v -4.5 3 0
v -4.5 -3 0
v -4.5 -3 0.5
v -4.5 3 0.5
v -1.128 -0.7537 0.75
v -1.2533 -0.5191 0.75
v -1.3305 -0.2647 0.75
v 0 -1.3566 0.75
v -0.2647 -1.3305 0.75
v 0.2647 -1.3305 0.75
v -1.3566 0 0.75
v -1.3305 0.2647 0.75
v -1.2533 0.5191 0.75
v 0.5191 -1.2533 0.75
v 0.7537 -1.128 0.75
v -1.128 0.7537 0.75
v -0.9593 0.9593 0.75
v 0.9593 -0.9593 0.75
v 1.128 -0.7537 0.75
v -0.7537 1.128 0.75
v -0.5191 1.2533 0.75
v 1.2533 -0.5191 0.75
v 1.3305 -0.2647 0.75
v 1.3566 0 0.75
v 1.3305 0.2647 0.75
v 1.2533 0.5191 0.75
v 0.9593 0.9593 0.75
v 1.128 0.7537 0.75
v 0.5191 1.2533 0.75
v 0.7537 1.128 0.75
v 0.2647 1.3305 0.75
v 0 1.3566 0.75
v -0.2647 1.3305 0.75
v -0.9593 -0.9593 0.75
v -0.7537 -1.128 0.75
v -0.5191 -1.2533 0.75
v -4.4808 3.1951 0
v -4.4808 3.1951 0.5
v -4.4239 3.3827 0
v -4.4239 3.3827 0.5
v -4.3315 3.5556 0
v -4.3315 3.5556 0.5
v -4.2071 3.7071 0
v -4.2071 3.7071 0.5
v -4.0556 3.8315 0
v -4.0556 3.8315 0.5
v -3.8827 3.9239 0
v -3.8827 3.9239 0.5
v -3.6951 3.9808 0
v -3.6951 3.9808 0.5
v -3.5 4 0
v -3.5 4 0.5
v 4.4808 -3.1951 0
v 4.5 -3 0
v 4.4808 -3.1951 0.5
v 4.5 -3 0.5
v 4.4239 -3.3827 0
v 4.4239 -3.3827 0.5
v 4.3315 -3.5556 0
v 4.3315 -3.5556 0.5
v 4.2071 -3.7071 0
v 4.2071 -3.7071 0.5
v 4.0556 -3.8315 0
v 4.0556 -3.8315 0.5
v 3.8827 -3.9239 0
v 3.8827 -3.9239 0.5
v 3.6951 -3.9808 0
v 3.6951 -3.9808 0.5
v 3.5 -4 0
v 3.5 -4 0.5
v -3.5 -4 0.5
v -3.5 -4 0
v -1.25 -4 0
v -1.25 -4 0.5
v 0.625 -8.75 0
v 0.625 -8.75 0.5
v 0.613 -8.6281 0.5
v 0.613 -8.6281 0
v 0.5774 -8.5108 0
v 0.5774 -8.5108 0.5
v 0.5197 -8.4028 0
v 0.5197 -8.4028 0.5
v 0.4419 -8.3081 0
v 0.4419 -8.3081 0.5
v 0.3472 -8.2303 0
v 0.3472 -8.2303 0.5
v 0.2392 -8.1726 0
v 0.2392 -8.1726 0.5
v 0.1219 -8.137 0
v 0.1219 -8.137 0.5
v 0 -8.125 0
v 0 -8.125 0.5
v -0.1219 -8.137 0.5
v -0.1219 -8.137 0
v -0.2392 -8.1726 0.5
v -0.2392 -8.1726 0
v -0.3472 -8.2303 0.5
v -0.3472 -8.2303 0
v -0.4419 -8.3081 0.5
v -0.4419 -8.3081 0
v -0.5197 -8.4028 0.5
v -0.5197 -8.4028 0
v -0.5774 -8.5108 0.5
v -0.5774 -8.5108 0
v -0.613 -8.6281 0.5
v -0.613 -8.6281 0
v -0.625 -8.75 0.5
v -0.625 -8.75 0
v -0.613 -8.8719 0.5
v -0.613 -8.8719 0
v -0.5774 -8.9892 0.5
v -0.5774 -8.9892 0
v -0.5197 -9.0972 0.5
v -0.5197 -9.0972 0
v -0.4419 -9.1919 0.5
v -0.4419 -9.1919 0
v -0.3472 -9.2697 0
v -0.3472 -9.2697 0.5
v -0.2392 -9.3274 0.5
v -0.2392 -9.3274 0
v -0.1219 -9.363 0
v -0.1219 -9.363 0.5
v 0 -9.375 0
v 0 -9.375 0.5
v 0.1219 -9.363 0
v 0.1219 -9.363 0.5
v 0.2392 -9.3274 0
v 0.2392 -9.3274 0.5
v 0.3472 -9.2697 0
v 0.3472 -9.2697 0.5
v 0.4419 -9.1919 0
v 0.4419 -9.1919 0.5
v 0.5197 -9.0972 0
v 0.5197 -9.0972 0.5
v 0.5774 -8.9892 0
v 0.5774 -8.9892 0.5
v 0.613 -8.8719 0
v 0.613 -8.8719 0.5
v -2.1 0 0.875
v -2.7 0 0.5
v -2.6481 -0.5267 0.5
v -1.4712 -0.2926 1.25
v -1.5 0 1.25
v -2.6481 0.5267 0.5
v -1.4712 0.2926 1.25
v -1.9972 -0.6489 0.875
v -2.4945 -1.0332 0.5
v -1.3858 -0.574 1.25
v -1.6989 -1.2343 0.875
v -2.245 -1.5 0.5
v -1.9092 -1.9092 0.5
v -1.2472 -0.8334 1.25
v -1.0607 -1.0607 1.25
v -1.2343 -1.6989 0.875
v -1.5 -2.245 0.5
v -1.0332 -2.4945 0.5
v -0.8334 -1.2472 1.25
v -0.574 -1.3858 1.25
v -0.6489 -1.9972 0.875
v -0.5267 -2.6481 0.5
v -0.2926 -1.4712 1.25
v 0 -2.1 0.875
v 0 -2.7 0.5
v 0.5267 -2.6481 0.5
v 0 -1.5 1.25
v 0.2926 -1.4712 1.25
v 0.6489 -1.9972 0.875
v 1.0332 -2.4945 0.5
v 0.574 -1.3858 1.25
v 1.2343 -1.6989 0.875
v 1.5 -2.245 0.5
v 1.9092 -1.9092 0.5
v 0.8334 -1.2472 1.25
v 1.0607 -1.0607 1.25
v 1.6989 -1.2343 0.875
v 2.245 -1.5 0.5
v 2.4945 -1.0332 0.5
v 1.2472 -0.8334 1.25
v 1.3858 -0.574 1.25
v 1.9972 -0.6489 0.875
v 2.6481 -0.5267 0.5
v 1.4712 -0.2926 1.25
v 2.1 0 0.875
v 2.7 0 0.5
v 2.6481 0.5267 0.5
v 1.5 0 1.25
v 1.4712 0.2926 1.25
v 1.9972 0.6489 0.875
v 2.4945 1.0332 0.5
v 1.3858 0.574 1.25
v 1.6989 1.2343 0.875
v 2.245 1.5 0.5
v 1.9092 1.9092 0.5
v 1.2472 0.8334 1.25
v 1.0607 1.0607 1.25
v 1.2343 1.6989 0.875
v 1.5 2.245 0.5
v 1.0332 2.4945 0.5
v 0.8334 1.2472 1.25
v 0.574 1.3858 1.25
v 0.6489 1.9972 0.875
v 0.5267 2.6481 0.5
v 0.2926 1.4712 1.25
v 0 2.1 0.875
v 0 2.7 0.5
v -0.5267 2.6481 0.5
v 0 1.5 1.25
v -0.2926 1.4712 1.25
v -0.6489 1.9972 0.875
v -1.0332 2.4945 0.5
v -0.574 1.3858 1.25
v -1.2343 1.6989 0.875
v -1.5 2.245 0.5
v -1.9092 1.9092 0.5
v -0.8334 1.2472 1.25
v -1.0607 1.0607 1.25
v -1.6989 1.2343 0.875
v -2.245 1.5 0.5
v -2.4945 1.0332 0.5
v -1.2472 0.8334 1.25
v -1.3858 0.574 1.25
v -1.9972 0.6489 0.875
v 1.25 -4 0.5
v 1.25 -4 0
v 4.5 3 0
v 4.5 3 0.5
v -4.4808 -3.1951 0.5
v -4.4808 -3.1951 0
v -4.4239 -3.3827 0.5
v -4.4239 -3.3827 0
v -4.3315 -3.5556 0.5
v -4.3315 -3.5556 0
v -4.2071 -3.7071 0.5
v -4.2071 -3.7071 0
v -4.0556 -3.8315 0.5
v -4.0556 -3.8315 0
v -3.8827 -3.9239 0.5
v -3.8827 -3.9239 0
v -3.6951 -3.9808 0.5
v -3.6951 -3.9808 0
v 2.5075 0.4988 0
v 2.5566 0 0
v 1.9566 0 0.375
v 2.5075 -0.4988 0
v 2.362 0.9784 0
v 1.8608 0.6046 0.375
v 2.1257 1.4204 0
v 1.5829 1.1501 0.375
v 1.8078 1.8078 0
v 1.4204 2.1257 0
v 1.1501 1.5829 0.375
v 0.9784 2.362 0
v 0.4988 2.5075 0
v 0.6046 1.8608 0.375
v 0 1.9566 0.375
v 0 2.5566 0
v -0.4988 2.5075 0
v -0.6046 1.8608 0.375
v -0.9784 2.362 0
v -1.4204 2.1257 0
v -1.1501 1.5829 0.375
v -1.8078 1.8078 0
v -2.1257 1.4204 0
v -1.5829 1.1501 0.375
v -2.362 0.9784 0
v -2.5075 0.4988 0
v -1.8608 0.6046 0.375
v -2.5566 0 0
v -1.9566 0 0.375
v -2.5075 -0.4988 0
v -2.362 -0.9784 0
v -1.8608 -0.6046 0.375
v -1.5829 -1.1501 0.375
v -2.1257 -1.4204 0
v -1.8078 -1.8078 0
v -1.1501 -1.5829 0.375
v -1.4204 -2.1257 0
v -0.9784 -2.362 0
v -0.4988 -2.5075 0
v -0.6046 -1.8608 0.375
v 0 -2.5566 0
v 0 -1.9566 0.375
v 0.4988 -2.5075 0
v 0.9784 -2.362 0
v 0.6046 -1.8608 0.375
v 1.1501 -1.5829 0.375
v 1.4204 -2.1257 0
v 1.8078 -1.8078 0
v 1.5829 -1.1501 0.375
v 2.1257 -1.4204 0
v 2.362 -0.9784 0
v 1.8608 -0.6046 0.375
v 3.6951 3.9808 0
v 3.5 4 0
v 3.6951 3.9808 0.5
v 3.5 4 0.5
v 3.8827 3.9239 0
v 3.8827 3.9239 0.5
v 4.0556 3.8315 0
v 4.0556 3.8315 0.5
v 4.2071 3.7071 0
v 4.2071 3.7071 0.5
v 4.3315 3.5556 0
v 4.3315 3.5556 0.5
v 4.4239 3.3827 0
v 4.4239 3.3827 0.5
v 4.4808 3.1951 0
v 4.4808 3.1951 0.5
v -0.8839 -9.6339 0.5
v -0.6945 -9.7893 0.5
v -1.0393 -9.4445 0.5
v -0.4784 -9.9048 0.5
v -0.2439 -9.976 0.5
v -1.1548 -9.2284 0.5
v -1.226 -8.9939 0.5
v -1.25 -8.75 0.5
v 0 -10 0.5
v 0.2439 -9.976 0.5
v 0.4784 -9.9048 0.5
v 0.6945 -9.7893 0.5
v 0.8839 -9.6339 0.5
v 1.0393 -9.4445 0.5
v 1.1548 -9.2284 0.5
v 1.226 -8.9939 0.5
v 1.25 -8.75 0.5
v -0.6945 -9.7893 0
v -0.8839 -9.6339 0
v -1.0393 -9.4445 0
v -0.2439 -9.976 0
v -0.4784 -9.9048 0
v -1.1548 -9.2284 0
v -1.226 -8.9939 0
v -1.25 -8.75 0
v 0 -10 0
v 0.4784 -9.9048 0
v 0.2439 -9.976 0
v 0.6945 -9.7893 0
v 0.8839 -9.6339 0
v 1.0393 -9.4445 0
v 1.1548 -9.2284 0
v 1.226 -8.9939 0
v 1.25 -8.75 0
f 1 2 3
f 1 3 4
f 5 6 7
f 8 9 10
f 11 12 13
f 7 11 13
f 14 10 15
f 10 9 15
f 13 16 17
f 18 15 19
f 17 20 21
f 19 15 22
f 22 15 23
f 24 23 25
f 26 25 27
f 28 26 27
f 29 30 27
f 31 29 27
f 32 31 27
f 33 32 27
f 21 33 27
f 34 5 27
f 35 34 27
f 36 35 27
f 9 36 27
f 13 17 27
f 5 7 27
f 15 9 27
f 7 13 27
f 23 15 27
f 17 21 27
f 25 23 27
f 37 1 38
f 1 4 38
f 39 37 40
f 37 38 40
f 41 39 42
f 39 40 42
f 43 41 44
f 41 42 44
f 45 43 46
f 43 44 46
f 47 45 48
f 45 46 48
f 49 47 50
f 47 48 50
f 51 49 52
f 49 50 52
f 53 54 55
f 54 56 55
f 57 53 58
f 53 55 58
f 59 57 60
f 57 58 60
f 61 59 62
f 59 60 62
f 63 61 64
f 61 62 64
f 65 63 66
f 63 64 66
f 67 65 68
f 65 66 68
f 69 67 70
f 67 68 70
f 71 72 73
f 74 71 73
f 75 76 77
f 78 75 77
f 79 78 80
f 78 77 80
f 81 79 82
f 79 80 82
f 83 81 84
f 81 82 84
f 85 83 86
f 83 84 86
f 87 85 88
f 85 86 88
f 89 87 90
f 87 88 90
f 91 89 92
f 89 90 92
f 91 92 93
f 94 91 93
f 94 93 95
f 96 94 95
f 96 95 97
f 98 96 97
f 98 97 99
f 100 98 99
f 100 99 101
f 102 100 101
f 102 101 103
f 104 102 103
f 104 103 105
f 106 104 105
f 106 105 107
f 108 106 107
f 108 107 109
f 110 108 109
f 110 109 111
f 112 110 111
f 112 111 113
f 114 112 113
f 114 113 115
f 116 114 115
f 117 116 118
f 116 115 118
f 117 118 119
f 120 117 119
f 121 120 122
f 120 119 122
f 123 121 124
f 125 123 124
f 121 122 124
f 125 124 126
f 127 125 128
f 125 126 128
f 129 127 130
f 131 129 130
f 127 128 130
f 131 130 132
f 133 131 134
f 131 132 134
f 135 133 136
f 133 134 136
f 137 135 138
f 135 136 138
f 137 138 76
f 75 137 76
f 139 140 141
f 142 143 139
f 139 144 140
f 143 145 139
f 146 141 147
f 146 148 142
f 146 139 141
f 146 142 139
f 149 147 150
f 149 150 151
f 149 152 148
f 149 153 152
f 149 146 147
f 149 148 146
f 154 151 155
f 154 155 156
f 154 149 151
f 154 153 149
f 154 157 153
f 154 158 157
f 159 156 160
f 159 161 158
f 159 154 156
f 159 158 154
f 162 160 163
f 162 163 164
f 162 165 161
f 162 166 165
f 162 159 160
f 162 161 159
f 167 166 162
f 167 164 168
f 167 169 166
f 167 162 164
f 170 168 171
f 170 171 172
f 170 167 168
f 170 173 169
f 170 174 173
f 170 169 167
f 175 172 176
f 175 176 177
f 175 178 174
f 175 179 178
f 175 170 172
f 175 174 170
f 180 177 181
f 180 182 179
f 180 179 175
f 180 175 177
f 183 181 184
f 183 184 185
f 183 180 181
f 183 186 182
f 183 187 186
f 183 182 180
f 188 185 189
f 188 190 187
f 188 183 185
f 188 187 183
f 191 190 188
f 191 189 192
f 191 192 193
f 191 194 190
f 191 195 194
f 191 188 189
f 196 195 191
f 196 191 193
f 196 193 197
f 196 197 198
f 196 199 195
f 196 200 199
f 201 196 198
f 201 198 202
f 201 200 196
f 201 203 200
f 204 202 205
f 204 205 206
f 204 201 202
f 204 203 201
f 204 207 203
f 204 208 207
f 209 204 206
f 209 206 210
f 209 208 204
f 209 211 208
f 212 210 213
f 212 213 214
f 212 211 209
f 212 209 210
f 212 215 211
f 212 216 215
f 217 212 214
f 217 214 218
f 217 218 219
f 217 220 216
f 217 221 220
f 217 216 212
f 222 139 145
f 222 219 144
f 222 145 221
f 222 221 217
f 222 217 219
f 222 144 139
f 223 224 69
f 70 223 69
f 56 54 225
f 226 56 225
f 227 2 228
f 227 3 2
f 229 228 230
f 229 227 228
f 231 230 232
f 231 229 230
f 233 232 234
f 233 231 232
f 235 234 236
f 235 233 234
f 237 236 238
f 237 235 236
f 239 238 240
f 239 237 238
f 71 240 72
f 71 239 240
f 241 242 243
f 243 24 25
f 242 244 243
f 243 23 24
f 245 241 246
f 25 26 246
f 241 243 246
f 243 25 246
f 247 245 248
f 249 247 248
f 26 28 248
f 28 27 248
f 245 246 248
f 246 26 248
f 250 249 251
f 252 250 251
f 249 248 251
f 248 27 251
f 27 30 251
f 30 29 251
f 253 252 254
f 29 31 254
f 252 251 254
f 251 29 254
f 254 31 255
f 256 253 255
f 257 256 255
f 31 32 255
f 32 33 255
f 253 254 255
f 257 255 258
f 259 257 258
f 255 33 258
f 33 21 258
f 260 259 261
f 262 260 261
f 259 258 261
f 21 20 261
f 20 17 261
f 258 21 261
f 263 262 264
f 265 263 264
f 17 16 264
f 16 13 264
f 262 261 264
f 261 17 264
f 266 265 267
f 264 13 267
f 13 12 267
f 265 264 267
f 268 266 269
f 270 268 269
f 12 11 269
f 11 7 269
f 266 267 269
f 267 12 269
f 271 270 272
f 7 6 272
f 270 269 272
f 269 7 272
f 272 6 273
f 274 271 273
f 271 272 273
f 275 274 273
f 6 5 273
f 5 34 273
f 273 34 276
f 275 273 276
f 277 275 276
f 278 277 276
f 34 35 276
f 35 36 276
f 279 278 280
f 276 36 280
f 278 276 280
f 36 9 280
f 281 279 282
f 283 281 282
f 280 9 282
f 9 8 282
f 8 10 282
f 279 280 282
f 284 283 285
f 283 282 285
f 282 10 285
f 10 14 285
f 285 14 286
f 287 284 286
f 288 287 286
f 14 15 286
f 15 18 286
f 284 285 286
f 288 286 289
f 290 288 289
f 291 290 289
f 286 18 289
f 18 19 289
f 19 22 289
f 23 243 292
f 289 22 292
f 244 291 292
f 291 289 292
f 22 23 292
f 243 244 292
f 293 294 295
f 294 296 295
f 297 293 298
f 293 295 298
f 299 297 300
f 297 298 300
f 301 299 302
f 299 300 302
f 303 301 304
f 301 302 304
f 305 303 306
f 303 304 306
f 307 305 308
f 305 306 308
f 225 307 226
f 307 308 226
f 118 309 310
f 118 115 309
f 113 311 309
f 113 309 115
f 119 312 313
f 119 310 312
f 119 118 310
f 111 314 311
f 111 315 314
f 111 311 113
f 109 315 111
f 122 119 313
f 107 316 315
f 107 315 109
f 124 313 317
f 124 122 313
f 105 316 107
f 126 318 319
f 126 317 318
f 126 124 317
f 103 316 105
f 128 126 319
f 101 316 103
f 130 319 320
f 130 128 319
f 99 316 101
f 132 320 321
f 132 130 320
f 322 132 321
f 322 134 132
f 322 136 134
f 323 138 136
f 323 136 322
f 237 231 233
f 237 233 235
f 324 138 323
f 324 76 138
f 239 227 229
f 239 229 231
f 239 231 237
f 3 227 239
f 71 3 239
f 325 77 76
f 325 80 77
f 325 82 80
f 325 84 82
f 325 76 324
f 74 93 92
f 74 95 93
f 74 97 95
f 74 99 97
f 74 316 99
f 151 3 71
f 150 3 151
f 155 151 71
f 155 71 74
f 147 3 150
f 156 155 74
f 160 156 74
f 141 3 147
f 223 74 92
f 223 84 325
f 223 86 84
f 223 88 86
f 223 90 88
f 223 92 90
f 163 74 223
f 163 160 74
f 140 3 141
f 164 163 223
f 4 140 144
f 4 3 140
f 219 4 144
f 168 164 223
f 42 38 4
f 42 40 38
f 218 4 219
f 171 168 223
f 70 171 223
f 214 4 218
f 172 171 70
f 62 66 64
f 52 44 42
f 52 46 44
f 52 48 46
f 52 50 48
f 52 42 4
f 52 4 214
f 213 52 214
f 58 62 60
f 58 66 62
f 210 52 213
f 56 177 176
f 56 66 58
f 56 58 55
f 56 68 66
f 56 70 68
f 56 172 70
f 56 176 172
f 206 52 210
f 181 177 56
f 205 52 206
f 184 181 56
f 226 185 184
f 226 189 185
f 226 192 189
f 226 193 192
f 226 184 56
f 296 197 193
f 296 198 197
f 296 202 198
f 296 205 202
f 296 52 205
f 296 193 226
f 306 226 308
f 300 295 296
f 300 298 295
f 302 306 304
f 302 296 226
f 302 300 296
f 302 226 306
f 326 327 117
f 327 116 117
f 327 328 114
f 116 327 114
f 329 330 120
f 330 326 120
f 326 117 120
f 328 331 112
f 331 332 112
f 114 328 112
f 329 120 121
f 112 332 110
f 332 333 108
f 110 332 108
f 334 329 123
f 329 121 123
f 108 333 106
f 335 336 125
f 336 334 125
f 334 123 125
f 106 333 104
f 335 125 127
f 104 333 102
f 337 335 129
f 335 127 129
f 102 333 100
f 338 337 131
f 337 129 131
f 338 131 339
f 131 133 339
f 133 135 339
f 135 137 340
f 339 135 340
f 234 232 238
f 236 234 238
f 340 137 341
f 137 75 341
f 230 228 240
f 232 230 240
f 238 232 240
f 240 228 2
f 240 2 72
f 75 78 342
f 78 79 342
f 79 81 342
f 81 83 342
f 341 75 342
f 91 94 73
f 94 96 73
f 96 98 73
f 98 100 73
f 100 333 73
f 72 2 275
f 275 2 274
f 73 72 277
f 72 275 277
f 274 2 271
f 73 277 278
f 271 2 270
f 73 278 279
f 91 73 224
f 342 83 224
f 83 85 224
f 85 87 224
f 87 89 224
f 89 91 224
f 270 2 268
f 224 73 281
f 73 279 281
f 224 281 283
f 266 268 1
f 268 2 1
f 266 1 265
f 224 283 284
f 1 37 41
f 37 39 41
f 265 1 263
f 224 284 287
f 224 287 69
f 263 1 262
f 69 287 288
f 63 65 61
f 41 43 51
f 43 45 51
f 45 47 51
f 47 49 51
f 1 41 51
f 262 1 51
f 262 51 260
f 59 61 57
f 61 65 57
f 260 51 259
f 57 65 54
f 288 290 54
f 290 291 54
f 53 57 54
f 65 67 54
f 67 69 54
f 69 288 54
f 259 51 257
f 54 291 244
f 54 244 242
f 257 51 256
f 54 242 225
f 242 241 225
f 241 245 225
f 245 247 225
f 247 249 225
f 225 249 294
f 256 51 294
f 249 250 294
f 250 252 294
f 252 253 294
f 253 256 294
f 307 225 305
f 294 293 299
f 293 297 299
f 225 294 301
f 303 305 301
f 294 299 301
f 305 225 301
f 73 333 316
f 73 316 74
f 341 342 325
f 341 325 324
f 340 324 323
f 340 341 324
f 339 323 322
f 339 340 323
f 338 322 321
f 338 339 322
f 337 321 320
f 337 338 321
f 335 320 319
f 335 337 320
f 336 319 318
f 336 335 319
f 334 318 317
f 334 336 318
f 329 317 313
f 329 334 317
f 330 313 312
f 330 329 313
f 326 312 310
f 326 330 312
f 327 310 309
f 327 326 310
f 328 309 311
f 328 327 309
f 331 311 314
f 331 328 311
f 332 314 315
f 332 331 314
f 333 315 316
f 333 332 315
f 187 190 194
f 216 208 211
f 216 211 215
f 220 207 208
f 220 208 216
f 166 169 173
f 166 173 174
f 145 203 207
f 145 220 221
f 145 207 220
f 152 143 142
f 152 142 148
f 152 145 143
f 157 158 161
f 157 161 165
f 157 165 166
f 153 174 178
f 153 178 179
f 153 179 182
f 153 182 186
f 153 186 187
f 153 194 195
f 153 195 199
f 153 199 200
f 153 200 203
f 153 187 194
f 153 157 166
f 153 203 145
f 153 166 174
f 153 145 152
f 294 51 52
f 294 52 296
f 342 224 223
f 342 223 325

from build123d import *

# Parameters (mm, degrees)
SKETCH1_W           = 9
SKETCH1_H           = 8
BOSS_EXTRUDE1_DEPTH = 0.5
BOSS_EXTRUDE2_DEPTH = 0.5
FILLET1_R           = 1
SKETCH4_R           = 0.625
CUT_EXTRUDE1_DEPTH  = 11.9772492


# Read off the part's stored shape, not the designer's step: Shell1
with BuildPart() as part:
    # Sketch1 → Boss-Extrude1 (new body)
    with BuildSketch(Plane.XY):
        Rectangle(SKETCH1_W, SKETCH1_H)
    extrude(amount=BOSS_EXTRUDE1_DEPTH)

    # Sketch2 → Boss-Extrude2 (add)
    with BuildSketch(Plane.XY):
        with BuildLine():
            Line((1.25, 0), (1.25, -8.75))
            ThreePointArc((1.25, -8.75), (0, -10), (-1.25, -8.75))
            Line((-1.25, -8.75), (-1.25, 0))
            ThreePointArc((-1.25, 0), (0, 1.25), (1.25, 0))
        make_face()
    extrude(amount=BOSS_EXTRUDE2_DEPTH)

    # Fillet1
    fillet1_edges = [part.edges().sort_by_distance(p)[0] for p in [
        (4.5, -4, 0.25),
        (-4.5, -4, 0.25),
        (-4.5, 4, 0.25),
        (4.5, 4, 0.25),
    ]]
    fillet(fillet1_edges, radius=FILLET1_R)

    # Sketch4 → Cut-Extrude1 (cut, through all)
    with BuildSketch(Plane.XY.offset(0.5)):
        with Locations((0, -8.75)):
            Circle(SKETCH4_R)
    extrude(amount=-CUT_EXTRUDE1_DEPTH, mode=Mode.SUBTRACT)

    # Sketch5 → Revolve1 (revolve)
    with BuildSketch(Plane(origin=(0, 0, 0), x_dir=(1, 0, 0), z_dir=(0, 1, 0)), mode=Mode.PRIVATE) as revolve1_sk:
        Polygon((0, -0.5), (2.7, -0.5), (1.5, -1.25), (0, -1.25), align=None)
    revolve(revolve1_sk.sketch.rotate(Axis((0, 0, -88.99), (0, 0, 1)), 180), axis=Axis((0, 0, -88.99), (0, 0, 1)))

    # Shell1 outline → Shell1 (revolve, cut)
    with BuildSketch(Plane.XZ):
        Polygon((2.556601887, 0), (1.356601887, 0.75), (0, 0.75), (0, 0), align=None)
    revolve(axis=Axis((0, 0, 0), (0, 0, 1)), mode=Mode.SUBTRACT)


solid = part.part
